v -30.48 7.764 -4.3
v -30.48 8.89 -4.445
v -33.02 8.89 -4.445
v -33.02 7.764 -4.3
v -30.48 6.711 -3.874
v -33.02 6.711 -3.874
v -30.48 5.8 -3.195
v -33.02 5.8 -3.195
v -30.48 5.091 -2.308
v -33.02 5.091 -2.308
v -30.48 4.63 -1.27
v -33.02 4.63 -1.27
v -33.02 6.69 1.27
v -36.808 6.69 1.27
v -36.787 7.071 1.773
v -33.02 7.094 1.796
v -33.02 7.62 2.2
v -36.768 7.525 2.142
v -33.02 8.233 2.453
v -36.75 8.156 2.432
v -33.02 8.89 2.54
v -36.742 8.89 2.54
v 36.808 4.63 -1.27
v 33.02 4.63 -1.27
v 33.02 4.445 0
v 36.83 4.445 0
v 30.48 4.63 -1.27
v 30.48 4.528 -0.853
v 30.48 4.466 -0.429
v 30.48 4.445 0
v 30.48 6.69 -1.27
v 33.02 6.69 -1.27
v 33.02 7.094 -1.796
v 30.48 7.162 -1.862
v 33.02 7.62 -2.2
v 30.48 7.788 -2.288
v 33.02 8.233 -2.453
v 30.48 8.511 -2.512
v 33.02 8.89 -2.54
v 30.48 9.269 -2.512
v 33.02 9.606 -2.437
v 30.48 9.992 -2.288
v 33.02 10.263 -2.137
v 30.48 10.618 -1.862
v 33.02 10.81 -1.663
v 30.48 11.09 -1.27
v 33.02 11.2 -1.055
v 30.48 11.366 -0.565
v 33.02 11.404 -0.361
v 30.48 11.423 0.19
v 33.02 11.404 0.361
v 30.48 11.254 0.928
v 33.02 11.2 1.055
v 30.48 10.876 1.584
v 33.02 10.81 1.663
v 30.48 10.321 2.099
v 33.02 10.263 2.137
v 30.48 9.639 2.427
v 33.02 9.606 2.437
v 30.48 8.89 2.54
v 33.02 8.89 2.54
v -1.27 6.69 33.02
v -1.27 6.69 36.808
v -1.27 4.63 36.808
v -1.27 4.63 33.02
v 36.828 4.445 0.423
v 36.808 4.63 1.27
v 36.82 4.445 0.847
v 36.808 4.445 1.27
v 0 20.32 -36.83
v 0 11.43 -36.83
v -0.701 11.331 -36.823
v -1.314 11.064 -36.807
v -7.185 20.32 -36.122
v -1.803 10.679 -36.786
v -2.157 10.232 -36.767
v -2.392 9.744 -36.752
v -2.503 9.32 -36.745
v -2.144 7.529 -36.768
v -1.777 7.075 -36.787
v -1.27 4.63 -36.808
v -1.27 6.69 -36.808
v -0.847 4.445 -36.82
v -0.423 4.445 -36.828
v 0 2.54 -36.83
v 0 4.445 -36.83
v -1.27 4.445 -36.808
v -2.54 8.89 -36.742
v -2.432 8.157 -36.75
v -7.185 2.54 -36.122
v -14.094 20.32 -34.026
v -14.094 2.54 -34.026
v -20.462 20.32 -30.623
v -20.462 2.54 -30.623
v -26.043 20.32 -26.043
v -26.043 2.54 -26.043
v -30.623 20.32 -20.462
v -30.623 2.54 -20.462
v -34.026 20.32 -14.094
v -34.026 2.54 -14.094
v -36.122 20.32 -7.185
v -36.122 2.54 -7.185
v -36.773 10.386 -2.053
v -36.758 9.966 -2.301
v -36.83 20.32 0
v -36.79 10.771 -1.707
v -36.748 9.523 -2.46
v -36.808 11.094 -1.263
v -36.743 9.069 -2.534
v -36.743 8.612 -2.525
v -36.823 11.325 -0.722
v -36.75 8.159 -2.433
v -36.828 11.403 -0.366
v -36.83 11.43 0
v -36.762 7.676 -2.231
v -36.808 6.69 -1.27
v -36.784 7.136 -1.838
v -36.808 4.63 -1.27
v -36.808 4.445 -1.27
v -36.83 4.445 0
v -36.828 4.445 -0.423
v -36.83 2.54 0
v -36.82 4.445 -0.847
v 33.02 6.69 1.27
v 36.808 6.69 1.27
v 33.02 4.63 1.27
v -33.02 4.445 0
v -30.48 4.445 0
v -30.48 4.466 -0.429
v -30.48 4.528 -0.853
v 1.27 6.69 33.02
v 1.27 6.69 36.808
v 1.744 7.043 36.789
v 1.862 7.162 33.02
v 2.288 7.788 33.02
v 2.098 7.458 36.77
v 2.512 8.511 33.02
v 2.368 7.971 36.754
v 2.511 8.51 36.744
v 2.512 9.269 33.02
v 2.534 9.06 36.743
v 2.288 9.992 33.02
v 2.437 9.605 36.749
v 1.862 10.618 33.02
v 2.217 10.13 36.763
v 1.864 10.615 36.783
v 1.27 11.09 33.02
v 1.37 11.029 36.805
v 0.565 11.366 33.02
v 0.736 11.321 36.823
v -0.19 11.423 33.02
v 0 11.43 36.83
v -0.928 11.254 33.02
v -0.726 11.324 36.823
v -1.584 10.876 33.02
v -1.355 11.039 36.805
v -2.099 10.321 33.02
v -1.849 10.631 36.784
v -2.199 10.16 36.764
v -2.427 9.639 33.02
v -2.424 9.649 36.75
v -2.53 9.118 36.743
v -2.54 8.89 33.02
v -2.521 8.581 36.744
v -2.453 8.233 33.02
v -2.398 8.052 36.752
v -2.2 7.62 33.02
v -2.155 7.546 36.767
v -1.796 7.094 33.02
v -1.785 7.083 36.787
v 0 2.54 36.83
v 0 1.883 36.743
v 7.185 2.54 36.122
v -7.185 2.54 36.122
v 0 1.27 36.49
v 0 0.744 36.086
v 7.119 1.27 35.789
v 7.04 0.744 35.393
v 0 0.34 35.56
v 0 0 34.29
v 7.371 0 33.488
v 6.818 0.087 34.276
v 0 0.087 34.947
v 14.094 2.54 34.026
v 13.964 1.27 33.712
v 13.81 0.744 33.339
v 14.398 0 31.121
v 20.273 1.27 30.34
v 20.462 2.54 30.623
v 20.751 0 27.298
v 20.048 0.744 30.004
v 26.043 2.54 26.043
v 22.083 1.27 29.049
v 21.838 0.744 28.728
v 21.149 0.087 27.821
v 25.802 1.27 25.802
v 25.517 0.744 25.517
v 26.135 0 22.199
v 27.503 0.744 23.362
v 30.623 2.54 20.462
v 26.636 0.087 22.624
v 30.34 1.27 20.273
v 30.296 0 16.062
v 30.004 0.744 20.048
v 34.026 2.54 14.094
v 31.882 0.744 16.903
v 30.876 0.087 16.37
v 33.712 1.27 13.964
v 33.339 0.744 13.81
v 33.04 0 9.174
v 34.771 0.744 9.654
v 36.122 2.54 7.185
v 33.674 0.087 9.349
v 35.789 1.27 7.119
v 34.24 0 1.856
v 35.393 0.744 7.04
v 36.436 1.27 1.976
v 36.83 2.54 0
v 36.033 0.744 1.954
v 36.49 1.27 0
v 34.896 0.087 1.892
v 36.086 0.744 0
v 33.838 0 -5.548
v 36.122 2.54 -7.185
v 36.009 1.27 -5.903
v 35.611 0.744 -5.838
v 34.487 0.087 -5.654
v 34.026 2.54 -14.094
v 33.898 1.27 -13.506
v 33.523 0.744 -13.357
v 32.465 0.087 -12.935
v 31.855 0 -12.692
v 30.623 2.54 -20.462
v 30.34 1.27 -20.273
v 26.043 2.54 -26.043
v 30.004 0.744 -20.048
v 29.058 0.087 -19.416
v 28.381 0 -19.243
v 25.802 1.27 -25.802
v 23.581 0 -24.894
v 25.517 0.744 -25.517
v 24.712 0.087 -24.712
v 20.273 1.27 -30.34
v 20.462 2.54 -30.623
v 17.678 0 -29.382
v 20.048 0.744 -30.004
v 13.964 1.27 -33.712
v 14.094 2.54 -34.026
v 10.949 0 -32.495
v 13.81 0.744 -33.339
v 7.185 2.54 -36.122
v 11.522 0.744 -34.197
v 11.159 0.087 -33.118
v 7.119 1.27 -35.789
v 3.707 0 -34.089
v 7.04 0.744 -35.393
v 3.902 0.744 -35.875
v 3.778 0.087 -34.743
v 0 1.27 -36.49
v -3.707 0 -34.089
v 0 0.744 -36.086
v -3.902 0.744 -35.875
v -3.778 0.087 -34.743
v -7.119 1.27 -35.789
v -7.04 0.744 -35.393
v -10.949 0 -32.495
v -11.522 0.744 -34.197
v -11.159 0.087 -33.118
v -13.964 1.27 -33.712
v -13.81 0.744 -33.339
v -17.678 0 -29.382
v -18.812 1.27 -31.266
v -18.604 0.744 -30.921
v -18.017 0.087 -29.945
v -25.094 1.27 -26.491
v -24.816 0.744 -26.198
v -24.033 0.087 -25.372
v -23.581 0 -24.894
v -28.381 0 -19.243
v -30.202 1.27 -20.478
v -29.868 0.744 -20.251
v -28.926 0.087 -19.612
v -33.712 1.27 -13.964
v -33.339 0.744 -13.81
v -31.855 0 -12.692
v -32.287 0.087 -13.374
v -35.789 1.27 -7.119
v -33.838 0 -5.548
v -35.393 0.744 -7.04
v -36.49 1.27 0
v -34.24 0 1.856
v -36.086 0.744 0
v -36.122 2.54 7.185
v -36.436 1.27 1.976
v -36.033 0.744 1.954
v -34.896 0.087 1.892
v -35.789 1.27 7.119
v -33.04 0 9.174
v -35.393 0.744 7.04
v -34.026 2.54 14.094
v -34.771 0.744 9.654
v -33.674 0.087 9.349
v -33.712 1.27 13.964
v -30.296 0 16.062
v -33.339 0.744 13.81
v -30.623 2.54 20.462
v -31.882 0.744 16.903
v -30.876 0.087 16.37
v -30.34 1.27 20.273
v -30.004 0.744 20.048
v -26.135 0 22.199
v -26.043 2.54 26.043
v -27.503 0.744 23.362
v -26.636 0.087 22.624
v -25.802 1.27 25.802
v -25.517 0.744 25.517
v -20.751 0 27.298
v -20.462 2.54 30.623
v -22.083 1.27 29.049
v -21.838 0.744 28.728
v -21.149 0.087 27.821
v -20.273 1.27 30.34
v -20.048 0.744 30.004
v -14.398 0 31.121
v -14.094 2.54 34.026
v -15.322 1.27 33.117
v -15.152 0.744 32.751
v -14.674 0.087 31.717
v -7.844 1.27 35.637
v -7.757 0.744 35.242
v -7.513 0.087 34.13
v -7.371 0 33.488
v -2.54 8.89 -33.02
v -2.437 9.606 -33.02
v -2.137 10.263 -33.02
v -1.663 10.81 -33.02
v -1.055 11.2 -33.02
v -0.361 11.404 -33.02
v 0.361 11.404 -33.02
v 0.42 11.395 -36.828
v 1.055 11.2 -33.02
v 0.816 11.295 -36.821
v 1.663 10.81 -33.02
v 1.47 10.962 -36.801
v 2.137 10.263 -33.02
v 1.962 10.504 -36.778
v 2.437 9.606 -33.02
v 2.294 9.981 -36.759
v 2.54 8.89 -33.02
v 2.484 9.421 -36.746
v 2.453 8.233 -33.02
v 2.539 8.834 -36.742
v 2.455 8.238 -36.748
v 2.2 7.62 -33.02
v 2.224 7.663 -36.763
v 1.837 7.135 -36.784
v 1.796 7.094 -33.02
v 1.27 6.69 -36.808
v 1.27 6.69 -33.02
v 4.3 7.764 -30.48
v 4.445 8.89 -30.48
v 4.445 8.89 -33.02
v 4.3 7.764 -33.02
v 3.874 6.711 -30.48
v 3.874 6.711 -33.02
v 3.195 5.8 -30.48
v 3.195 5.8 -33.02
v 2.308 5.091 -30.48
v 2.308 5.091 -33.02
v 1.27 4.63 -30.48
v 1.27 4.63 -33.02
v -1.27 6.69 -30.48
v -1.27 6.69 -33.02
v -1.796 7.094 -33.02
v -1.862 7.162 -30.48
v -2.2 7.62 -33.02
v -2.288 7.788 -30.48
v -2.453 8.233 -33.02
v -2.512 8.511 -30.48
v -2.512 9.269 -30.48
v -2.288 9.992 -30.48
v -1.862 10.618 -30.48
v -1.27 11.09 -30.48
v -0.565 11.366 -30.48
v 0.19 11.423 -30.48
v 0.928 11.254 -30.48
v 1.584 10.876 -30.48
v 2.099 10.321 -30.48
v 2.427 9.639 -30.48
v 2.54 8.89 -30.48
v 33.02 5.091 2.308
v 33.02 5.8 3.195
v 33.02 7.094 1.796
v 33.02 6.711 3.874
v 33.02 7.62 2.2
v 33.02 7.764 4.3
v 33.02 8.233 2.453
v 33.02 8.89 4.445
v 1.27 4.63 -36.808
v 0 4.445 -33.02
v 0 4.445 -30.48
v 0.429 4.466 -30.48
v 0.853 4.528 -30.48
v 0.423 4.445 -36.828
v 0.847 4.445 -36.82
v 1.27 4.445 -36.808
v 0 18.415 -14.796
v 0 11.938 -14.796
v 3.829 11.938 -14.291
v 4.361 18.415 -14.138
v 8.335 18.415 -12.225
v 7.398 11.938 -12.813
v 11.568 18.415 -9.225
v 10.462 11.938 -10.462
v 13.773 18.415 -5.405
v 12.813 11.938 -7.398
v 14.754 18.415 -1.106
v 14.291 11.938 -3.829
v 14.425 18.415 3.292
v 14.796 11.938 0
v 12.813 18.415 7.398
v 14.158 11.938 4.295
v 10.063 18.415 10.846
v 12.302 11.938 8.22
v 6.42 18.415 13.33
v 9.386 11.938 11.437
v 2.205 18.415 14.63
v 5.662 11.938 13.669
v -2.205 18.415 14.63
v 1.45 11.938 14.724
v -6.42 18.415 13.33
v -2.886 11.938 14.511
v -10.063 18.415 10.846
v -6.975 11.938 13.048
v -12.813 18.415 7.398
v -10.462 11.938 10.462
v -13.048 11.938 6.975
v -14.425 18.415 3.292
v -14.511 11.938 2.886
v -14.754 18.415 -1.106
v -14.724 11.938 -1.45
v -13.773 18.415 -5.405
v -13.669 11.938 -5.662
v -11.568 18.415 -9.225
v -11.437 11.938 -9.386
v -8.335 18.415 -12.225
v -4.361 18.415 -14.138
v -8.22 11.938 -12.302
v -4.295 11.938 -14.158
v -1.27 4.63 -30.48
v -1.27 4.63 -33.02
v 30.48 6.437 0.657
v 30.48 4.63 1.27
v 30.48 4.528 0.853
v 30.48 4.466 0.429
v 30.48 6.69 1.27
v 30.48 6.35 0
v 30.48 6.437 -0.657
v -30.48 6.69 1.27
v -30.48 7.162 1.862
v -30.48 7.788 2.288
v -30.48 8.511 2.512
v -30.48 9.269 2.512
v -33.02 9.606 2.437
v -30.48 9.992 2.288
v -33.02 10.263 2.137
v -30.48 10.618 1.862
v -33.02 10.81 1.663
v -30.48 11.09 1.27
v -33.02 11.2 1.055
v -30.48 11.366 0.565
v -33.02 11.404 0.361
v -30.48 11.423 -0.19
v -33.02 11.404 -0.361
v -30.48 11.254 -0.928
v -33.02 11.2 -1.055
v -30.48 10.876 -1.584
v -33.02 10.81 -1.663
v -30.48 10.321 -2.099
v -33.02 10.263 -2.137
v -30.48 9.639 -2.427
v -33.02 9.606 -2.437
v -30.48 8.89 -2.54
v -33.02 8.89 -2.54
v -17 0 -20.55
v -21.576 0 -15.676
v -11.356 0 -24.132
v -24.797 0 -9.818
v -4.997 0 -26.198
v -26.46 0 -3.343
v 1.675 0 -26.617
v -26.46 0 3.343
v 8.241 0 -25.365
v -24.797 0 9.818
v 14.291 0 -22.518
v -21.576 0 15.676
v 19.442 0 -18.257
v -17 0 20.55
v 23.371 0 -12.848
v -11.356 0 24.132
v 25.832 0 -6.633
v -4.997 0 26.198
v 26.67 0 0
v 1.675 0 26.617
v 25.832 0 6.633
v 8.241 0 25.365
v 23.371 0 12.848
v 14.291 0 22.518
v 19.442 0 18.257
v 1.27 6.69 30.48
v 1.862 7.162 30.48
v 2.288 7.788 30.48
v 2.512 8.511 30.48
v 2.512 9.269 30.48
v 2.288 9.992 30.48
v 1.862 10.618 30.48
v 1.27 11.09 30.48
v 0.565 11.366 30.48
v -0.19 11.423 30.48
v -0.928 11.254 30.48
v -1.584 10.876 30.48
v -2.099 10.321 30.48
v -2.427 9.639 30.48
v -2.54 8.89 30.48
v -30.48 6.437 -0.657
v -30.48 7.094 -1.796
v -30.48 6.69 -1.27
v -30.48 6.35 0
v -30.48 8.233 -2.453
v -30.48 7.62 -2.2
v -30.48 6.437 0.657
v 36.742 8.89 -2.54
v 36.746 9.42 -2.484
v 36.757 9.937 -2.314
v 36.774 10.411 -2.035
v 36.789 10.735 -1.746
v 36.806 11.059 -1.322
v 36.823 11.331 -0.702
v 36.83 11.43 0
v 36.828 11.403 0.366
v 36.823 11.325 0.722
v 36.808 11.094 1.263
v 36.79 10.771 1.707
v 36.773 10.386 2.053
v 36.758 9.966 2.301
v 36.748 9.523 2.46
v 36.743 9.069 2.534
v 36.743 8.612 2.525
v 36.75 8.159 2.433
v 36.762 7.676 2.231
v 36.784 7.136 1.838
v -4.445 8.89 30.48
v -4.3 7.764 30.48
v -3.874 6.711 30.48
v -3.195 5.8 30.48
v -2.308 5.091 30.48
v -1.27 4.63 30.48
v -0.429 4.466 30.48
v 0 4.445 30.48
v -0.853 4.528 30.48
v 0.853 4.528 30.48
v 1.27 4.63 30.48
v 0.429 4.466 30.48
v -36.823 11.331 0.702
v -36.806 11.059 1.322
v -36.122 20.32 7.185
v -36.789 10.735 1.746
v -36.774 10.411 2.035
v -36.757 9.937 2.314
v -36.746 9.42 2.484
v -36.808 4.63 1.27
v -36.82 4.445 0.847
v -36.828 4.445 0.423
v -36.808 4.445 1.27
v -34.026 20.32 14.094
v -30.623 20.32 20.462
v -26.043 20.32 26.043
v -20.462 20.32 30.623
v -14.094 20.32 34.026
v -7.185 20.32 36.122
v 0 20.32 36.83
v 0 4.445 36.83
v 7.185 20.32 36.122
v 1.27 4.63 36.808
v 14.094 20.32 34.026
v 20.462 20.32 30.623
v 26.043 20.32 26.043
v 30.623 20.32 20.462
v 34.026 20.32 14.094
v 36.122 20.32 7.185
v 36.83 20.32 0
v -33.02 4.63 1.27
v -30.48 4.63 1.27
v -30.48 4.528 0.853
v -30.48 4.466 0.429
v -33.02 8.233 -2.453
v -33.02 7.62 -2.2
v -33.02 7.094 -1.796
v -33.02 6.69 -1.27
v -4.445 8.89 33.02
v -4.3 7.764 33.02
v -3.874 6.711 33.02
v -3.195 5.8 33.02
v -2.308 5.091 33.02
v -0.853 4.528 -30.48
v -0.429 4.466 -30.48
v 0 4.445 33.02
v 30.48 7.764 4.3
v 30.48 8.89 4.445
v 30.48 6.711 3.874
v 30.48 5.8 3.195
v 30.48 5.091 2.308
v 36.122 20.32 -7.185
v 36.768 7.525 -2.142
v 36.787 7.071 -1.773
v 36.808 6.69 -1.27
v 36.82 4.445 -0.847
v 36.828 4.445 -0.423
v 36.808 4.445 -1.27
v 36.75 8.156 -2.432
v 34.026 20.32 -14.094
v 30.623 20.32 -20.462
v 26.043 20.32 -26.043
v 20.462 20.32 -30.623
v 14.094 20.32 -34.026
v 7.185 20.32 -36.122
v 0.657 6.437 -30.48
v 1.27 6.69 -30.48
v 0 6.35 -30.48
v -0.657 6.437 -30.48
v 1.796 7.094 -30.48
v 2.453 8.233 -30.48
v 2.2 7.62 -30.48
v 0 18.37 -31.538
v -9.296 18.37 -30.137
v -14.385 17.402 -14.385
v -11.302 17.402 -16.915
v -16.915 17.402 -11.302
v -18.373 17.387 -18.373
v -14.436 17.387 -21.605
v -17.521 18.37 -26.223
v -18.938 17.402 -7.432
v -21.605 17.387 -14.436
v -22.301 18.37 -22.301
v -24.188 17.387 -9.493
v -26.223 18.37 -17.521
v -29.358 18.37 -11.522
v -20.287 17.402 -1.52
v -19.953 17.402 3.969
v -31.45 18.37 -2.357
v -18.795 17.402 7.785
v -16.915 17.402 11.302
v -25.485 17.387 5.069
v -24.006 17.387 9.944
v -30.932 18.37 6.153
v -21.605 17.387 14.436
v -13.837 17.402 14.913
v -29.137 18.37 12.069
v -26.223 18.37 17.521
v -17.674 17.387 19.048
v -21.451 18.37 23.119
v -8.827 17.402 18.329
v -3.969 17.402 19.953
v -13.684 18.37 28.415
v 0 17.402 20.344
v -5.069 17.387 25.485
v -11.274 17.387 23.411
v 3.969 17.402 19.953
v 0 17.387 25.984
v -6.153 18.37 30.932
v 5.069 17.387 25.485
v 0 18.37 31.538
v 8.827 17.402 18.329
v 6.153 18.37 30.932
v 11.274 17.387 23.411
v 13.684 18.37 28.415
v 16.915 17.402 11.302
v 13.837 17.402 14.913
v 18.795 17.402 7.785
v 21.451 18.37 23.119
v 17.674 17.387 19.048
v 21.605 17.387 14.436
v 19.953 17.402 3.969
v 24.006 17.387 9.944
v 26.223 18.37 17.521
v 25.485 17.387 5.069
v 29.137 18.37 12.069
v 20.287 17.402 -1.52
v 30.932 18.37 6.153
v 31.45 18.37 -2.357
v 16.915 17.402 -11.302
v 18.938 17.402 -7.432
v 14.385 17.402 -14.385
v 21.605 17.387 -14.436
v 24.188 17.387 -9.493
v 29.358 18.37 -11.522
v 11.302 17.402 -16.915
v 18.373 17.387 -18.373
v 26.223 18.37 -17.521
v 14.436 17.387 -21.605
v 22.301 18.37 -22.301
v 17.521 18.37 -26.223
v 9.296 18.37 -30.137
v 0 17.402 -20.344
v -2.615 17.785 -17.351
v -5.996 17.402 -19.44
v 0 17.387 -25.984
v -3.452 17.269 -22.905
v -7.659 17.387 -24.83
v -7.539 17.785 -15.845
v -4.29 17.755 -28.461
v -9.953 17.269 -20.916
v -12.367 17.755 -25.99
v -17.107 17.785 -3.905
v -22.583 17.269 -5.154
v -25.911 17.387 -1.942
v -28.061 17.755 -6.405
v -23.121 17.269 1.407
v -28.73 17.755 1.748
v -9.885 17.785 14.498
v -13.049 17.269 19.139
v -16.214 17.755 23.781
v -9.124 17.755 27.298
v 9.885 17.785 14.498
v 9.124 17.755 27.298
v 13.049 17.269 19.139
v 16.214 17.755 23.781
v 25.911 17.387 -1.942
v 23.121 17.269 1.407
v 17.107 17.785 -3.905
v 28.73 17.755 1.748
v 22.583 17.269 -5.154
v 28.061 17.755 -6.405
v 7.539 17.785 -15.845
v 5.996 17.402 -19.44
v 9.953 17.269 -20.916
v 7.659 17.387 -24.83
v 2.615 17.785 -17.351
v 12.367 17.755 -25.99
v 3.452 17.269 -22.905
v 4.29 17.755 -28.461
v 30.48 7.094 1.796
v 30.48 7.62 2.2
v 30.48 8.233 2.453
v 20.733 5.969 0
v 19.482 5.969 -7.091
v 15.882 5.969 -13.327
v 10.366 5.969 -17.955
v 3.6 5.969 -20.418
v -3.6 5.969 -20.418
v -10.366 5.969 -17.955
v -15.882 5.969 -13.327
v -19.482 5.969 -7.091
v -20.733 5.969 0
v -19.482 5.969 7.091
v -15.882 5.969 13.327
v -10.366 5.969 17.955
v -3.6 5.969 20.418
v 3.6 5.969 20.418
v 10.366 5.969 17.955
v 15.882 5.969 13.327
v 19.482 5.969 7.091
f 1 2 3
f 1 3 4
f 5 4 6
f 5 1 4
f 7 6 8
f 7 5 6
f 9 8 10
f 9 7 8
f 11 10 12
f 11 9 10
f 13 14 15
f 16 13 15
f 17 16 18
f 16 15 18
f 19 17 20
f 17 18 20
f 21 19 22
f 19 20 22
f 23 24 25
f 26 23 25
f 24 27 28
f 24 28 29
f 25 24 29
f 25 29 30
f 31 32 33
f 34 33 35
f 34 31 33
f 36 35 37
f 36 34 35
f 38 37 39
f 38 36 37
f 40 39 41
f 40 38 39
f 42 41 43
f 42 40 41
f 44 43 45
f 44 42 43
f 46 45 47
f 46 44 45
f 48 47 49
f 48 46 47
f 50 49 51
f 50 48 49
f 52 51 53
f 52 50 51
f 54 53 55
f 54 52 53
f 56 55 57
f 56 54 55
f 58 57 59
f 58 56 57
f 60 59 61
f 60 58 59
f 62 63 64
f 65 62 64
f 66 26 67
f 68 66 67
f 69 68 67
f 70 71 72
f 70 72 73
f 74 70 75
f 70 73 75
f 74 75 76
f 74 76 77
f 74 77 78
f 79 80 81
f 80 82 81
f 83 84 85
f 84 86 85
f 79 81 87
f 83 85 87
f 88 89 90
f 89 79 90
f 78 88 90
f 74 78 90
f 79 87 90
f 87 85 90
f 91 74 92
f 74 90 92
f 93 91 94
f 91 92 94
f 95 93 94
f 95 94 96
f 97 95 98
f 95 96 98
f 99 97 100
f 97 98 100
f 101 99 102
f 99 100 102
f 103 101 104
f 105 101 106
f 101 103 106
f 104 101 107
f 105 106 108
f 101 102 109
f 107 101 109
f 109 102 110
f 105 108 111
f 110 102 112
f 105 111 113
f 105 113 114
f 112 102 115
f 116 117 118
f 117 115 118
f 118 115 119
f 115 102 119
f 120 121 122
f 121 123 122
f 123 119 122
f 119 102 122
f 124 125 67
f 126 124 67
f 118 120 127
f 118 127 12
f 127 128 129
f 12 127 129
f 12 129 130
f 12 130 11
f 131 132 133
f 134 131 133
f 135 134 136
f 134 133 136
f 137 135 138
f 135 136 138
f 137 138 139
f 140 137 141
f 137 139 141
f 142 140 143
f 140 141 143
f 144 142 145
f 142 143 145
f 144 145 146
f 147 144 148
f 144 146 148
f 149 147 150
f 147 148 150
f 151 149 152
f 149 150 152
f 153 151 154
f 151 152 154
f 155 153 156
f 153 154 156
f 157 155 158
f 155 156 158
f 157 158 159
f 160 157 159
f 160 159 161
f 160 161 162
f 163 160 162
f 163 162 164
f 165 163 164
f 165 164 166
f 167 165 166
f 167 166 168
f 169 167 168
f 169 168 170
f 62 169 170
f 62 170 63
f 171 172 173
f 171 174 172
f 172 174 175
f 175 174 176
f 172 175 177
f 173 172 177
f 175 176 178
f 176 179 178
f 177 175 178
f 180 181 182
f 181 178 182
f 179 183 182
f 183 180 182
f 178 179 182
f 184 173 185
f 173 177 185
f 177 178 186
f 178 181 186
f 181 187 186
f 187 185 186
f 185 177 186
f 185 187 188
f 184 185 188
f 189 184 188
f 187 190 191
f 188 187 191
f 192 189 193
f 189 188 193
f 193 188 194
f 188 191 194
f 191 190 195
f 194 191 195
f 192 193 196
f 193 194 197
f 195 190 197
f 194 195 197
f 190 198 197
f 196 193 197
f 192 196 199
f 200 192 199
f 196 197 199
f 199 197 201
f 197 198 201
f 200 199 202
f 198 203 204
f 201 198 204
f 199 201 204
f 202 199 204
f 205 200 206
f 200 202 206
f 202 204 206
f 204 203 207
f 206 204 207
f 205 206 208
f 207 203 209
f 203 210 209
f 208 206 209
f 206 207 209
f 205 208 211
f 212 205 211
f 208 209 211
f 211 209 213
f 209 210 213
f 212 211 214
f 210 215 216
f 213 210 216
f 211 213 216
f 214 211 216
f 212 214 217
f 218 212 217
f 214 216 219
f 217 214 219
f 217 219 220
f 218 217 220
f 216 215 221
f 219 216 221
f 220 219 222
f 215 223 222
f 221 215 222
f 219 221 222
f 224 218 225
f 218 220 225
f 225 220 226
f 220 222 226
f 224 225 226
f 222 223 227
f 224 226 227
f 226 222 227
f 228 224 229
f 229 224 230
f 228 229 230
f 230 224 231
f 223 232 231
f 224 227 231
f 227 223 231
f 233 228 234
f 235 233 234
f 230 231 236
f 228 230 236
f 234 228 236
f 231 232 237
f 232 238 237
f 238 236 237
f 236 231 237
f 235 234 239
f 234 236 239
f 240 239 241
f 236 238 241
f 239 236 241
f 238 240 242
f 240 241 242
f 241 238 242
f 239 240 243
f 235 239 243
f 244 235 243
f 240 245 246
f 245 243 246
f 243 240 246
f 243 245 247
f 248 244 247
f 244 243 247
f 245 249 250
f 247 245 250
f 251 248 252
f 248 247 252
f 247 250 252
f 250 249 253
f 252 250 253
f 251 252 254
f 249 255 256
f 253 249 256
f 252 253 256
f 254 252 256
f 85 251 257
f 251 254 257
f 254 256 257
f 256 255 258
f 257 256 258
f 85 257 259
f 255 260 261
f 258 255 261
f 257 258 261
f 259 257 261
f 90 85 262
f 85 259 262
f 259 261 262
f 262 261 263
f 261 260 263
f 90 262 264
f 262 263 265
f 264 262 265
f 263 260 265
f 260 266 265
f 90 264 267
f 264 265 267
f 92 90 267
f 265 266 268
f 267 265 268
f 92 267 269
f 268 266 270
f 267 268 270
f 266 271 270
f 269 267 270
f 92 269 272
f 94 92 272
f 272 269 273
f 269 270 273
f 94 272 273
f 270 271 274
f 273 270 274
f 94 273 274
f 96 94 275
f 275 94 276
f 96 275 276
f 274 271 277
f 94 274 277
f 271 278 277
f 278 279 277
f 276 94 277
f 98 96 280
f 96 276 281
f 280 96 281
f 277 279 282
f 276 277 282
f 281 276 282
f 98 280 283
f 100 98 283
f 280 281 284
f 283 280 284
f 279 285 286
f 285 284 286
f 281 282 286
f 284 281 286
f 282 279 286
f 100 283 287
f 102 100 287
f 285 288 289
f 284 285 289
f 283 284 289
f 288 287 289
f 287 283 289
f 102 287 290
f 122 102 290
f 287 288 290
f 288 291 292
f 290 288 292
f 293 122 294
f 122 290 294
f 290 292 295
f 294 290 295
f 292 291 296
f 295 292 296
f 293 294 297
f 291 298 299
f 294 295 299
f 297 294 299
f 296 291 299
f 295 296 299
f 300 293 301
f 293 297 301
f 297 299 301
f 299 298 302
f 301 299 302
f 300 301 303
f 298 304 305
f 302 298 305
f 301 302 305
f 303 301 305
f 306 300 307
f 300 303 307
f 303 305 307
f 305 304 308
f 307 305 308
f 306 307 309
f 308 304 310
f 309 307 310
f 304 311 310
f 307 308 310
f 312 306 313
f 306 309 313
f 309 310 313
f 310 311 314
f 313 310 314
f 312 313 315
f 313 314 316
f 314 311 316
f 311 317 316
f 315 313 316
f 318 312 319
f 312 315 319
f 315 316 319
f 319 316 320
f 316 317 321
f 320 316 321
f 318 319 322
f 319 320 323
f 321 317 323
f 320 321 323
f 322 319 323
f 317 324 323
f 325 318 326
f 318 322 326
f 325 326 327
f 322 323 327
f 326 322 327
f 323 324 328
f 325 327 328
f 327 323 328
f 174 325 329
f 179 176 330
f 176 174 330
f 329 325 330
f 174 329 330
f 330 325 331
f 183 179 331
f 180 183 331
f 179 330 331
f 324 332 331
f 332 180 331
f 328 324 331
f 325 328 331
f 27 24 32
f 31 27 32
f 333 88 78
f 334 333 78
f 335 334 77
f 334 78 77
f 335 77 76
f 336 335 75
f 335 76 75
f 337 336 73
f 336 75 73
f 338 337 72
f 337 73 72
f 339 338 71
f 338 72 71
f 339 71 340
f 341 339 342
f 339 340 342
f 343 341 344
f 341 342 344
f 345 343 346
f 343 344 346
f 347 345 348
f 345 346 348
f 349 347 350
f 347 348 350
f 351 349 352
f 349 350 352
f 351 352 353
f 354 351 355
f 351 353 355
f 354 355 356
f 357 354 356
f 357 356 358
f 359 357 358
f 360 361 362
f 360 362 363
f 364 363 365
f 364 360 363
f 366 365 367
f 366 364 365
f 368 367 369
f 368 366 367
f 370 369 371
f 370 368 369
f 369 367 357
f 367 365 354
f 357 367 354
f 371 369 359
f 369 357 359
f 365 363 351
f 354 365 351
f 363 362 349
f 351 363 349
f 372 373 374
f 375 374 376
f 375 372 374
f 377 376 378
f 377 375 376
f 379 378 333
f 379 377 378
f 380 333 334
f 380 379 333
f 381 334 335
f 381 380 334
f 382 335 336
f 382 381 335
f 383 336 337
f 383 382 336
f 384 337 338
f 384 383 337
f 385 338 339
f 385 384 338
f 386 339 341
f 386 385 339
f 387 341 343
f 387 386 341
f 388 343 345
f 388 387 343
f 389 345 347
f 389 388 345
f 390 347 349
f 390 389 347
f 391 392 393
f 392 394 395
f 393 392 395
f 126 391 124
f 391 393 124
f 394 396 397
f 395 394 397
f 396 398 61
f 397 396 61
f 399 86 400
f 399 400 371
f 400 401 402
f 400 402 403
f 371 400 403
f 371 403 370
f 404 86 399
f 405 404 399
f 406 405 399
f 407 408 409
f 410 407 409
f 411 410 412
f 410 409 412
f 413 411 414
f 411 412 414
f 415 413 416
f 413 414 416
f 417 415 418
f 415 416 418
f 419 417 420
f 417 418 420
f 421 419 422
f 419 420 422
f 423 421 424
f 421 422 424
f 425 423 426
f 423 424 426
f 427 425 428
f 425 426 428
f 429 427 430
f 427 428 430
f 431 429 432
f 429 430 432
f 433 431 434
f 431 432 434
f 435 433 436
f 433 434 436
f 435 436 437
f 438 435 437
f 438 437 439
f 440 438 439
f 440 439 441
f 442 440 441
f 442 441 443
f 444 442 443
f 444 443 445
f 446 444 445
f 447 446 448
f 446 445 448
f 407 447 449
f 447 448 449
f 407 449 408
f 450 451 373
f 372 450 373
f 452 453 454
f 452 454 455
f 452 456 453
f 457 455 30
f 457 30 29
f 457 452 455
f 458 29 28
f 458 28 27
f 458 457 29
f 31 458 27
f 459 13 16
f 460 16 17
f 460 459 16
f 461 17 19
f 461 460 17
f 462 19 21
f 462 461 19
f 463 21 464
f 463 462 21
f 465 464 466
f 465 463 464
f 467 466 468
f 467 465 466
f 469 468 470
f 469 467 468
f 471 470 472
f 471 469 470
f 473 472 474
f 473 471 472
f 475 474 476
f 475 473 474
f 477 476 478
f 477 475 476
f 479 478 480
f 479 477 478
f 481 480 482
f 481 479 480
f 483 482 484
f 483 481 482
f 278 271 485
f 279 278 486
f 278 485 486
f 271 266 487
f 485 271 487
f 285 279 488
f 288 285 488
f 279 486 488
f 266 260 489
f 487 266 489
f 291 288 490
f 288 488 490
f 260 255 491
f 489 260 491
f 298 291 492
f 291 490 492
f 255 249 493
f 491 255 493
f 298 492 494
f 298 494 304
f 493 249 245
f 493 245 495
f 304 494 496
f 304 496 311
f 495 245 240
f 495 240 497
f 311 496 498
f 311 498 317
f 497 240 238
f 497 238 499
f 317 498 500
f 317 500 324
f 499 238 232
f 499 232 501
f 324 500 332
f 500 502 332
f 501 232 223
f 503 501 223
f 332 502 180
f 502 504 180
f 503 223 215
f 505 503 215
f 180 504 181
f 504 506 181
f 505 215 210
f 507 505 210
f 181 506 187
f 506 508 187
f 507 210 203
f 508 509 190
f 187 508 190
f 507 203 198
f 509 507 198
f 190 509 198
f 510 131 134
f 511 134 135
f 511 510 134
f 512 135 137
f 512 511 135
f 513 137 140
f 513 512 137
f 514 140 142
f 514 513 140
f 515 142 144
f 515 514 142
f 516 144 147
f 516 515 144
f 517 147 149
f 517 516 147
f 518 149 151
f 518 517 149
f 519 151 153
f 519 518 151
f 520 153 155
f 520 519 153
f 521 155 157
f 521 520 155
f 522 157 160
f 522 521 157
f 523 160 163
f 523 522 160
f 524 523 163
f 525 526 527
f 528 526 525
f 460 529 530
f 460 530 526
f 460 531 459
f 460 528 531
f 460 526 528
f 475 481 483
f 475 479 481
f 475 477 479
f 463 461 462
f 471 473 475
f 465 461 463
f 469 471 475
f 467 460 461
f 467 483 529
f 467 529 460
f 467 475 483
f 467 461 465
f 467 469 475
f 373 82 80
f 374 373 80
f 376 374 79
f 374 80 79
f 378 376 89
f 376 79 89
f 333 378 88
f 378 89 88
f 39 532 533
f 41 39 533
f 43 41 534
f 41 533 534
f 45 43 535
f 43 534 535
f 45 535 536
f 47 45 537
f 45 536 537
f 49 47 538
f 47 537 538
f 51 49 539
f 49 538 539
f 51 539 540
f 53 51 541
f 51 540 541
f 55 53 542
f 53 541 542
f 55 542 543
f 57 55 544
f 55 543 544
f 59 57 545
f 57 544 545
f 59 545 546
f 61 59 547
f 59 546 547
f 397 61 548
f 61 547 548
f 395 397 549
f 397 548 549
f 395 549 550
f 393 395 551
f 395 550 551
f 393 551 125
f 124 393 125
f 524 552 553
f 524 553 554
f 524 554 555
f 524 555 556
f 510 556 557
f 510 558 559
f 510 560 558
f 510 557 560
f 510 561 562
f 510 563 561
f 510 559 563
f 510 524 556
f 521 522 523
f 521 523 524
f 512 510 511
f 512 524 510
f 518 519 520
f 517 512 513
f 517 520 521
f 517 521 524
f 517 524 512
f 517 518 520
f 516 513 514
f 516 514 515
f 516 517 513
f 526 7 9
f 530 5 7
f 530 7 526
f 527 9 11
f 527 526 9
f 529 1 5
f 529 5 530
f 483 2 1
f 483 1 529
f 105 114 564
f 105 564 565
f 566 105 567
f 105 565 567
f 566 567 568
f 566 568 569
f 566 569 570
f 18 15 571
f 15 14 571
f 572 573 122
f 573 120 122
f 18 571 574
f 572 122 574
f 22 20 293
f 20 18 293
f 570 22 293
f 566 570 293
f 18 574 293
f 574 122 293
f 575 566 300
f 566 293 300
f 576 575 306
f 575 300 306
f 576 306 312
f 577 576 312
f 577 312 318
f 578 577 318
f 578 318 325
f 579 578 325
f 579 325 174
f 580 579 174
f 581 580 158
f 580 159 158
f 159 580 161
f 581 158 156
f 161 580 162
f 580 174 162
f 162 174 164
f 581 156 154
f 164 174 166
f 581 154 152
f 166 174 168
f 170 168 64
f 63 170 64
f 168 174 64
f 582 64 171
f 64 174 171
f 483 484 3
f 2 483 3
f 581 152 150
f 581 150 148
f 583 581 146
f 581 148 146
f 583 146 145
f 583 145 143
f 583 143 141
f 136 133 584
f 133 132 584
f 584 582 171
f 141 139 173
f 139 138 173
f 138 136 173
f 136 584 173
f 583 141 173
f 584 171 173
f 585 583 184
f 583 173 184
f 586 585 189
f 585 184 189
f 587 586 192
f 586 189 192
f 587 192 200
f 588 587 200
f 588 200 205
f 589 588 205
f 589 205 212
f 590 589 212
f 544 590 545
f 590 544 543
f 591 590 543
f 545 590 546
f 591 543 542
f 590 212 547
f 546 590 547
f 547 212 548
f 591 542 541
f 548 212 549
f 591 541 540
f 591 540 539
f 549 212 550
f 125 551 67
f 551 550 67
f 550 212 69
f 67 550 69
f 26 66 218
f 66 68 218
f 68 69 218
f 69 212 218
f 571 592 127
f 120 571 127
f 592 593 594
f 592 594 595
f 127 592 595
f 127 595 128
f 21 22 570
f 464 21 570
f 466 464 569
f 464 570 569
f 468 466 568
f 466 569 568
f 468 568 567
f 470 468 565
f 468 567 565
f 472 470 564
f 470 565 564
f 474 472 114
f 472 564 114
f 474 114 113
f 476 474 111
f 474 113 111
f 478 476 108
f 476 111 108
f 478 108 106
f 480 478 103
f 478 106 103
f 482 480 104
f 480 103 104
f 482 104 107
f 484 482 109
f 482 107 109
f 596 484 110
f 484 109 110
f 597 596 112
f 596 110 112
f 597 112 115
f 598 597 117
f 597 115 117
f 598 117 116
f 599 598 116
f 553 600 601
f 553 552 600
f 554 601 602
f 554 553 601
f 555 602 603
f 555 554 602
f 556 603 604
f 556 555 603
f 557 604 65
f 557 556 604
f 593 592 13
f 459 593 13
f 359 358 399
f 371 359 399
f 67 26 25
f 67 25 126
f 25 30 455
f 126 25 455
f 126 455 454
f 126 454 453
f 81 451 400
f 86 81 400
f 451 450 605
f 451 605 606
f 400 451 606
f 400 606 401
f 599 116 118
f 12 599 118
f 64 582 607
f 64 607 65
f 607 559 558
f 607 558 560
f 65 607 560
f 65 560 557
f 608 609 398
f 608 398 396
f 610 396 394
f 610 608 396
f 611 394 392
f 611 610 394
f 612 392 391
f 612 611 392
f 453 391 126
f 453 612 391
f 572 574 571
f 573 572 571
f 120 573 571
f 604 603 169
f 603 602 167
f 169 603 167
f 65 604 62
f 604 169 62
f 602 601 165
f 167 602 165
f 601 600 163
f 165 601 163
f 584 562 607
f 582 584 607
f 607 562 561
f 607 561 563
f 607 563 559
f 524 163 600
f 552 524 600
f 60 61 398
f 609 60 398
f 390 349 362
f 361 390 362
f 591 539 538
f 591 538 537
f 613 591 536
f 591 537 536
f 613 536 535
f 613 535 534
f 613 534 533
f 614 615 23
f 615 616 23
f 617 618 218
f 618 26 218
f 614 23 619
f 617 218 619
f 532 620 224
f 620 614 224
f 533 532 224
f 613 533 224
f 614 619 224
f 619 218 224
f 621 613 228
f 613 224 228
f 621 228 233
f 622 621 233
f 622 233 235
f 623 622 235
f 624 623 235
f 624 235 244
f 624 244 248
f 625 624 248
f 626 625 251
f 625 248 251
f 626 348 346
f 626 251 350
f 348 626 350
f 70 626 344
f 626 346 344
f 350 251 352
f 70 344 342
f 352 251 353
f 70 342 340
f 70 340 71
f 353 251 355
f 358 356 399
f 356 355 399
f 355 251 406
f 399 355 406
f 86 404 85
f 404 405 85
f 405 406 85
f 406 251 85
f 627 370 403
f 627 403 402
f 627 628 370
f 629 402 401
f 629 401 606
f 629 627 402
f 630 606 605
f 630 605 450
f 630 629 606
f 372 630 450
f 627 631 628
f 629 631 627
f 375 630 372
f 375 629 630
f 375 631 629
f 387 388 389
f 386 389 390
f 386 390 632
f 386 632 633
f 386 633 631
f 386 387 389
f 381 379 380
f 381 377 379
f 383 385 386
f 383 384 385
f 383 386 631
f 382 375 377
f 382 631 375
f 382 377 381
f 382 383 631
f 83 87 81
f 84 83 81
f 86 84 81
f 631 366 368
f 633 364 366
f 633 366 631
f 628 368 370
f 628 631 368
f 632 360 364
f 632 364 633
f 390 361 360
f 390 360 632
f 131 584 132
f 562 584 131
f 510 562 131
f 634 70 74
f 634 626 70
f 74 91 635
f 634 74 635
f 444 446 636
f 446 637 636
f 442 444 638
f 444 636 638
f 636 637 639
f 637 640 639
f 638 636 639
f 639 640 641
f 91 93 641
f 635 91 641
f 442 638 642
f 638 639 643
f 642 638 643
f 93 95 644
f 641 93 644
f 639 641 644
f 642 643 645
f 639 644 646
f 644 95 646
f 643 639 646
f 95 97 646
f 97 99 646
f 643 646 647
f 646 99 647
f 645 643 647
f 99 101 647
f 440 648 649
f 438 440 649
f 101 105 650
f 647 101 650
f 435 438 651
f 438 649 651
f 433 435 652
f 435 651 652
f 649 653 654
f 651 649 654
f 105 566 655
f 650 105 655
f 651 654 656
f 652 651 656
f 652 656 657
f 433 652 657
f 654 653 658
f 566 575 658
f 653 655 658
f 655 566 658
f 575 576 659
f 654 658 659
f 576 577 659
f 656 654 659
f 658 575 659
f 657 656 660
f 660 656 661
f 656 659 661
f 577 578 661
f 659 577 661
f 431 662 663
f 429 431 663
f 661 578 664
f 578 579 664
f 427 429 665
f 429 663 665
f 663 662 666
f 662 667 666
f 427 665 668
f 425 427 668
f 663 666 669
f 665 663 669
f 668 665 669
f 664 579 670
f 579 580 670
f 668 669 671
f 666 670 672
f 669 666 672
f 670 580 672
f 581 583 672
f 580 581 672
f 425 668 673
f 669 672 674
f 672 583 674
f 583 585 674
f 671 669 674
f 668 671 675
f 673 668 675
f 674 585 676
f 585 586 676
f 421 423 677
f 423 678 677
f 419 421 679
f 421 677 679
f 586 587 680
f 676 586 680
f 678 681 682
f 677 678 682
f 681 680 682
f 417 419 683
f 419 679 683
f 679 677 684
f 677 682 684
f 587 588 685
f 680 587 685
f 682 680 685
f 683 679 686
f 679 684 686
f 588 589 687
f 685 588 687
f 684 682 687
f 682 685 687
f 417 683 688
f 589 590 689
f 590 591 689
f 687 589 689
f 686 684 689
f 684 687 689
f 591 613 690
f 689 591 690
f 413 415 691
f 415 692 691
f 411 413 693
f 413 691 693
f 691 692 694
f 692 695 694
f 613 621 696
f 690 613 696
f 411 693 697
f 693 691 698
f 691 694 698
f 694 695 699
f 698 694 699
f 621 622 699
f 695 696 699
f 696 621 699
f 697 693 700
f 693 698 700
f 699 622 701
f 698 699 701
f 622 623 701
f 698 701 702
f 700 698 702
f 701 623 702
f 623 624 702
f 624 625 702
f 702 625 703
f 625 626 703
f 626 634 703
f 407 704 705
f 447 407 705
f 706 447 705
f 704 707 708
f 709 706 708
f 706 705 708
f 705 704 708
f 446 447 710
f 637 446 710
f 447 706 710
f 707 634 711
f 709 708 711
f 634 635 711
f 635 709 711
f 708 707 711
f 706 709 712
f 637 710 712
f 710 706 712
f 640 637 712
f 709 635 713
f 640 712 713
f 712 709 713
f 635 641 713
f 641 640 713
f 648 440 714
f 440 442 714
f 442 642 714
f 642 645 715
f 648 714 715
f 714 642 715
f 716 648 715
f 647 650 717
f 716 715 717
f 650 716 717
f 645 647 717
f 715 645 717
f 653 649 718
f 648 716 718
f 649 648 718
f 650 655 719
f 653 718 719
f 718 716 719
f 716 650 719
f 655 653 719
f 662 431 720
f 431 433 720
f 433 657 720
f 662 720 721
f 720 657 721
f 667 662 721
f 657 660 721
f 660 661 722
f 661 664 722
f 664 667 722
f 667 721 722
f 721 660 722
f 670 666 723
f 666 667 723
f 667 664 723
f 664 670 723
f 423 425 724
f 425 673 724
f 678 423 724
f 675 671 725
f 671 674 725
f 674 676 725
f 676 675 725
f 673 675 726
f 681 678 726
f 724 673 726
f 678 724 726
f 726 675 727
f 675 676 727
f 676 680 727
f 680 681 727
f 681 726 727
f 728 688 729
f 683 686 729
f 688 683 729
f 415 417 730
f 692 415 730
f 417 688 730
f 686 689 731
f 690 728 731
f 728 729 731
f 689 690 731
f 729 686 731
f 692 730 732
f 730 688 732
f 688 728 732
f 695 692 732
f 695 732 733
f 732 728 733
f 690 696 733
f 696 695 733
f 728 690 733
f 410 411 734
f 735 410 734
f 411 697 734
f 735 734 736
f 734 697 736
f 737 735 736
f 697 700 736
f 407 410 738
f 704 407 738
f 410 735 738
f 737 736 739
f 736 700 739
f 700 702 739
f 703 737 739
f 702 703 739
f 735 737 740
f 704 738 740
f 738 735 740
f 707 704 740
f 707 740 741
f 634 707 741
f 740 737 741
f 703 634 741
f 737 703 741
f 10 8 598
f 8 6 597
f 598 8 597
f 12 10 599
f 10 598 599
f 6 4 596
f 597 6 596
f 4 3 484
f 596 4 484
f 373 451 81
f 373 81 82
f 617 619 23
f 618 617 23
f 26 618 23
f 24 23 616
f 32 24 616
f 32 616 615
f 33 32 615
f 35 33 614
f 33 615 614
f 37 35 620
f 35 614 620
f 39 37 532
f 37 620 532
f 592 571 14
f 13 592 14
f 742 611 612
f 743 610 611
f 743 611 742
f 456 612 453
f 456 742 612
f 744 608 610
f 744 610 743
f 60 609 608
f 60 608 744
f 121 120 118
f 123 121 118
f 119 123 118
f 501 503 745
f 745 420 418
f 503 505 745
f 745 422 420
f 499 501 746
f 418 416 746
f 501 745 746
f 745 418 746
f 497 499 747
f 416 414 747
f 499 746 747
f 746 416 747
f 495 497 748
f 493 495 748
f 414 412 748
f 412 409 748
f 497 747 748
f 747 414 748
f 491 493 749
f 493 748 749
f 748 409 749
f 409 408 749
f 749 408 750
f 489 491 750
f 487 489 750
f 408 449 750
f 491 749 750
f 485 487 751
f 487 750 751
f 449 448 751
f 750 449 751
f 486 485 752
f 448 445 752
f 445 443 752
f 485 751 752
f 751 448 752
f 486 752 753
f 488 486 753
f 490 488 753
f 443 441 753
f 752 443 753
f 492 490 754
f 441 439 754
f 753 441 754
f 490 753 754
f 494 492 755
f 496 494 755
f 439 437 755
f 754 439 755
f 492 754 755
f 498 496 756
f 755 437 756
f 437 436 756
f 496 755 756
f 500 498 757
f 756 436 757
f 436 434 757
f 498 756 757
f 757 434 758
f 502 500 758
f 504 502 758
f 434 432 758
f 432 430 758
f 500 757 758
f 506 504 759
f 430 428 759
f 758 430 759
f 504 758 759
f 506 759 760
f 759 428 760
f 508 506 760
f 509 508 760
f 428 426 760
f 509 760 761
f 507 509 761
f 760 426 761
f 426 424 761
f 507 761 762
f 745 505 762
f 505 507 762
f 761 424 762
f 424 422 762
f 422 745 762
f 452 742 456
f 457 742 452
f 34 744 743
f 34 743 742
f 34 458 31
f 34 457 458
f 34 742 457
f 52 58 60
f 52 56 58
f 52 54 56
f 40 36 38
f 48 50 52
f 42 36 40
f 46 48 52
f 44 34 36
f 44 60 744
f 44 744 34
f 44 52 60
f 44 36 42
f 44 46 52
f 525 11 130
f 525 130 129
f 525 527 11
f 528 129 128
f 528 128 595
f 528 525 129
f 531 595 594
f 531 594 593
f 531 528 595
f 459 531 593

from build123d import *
from build123d.topology import SkipClean

# Parameters (mm, degrees)
SKETCH1_R           = 36.83
BOSS_EXTRUDE1_DEPTH = 20.32
FILLET1_R           = 2.54
SKETCH2_R           = 26.67
SKETCH3_R           = 14.7955
SKETCH4_R           = 14.7955
CUT_EXTRUDE1_DEPTH  = 76.2
SKETCH8_R           = 2.54
CUT_EXTRUDE2_DEPTH  = 6.35
CIRPATTERN1_COUNT   = 4
CUT_EXTRUDE3_DEPTH  = 6.35
SKETCH10_R          = 4.445
CUT_EXTRUDE4_DEPTH  = 2.54
BOSS_EXTRUDE2_DEPTH = 2.54
BOSS_EXTRUDE3_DEPTH = 6.35
SKETCH13_R          = 39.975148753
SKETCH13_R_2        = 36.83
CUT_EXTRUDE5_DEPTH  = 21.59
CIRPATTERN2_COUNT   = 4


with BuildPart() as part:
    # Sketch1 → Boss-Extrude1 (new body)
    with BuildSketch(Plane(origin=(0, 0, 0), x_dir=(1, 0, 0), z_dir=(0, 1, 0))):
        with Locations(Location((0, 0, 0), (0, 0, 270))):
            Circle(SKETCH1_R)
    extrude(amount=BOSS_EXTRUDE1_DEPTH)

    # Fillet1
    fillet1_edges = [part.edges().sort_by_distance(p)[0] for p in [
        (0, 0, -36.83),
    ]]
    fillet(fillet1_edges, radius=FILLET1_R)

    # Sketch2 → Cut-Loft1 section 0
    with BuildSketch(Plane(origin=(0, 0, 0), x_dir=(1, 0, 0), z_dir=(0, 1, 0))):
        Circle(SKETCH2_R)
    # Sketch3 → Cut-Loft1 section 1
    with BuildSketch(Plane(origin=(0, 11.938, 0), x_dir=(1, 0, 0), z_dir=(0, 1, 0))):
        Circle(SKETCH3_R)
    loft(mode=Mode.SUBTRACT)

    # Sketch4 → Cut-Extrude1 (cut)
    with BuildSketch(Plane.XZ.offset(-11.938)):
        with Locations(Location((0, 0, 0), (0, 0, 270))):
            Circle(SKETCH4_R)
    extrude(amount=-CUT_EXTRUDE1_DEPTH, mode=Mode.SUBTRACT)

    # Sketch8 → Cut-Extrude2 (cut)
    with BuildSketch(Plane.XY.offset(36.83)):
        with Locations((0, 8.89)):
            Circle(SKETCH8_R)
    cut_extrude2 = extrude(amount=-CUT_EXTRUDE2_DEPTH, mode=Mode.SUBTRACT)

    # CirPattern1: Cut-Extrude2 ×4 about axis
    cirpattern1_axis = Axis((0, 0, 0), (0, 1, 0))
    for i in range(1, CIRPATTERN1_COUNT):
        add(cut_extrude2.rotate(cirpattern1_axis, i * 360 / CIRPATTERN1_COUNT), mode=Mode.SUBTRACT)

    # Sketch9 → Cut-Extrude3 (cut)
    with BuildSketch(Plane.XY.offset(36.83)):
        with BuildLine():
            Line((-1.27, 4.445), (1.27, 4.445))
            Line((1.27, 4.445), (1.27, 6.690295474))
            ThreePointArc((1.27, 6.690295474), (0, 6.35), (-1.27, 6.690295474))
            Line((-1.27, 6.690295474), (-1.27, 4.445))
        make_face()
    cut_extrude3 = extrude(amount=-CUT_EXTRUDE3_DEPTH, mode=Mode.SUBTRACT)

    # Sketch10 → Cut-Extrude4 (cut)
    with BuildSketch(Plane.XY.offset(30.48)):
        with Locations((0, 8.89)):
            Circle(SKETCH10_R)
    cut_extrude4 = extrude(amount=CUT_EXTRUDE4_DEPTH, mode=Mode.SUBTRACT)

    # Sketch11 → Boss-Extrude2 (add)
    with BuildSketch(Plane.XY.offset(30.48)):
        with BuildLine():
            Line((-2.54, 8.89), (-4.445, 8.89))
            ThreePointArc((-4.445, 8.89), (2.656395584, 12.453928661), (1.27, 4.630290503))
            Line((1.27, 4.630290503), (1.27, 6.690295474))
            ThreePointArc((1.27, 6.690295474), (1.27, 11.089704526), (-2.54, 8.89))
        make_face()
    boss_extrude2 = extrude(amount=BOSS_EXTRUDE2_DEPTH)

    # Sketch12 → Boss-Extrude3 (add)
    with BuildSketch(Plane.XY.offset(30.48)):
        with BuildLine():
            Line((-1.27, 4.445), (-1.1e-08, 4.445))
            ThreePointArc((-1.1e-08, 4.445), (-0.641722798, 4.491566546), (-1.27, 4.630290503))
            Line((-1.27, 4.630290503), (-1.27, 4.445))
        make_face()
        with BuildLine():
            Line((-1.1e-08, 4.445), (1.27, 4.445))
            Line((1.27, 4.445), (1.27, 4.630290503))
            ThreePointArc((1.27, 4.630290503), (0.641722787, 4.491566544), (-1.1e-08, 4.445))
        make_face()
    boss_extrude3 = extrude(amount=BOSS_EXTRUDE3_DEPTH)

    # Sketch13 → Cut-Extrude5 (cut)
    with BuildSketch(Plane.XZ):
        Circle(SKETCH13_R)
        with Locations(Location((0, 0, 0), (0, 0, 90))):
            Circle(SKETCH13_R_2, mode=Mode.SUBTRACT)
    cut_extrude5 = extrude(amount=-CUT_EXTRUDE5_DEPTH, mode=Mode.SUBTRACT)

    # CirPattern2: Cut-Extrude3, Cut-Extrude4, Boss-Extrude2, Boss-Extrude3, Cut-Extrude5 ×4 about axis
    with SkipClean():  # the faces are left unmerged after this step: merging them gives an invalid solid
        cirpattern2_axis = Axis((0, 0, 0), (0, 1, 0))
        add([cut_extrude3.rotate(cirpattern2_axis, i * 360 / CIRPATTERN2_COUNT) for i in range(1, CIRPATTERN2_COUNT)], mode=Mode.SUBTRACT)
        add([cut_extrude4.rotate(cirpattern2_axis, i * 360 / CIRPATTERN2_COUNT) for i in range(1, CIRPATTERN2_COUNT)], mode=Mode.SUBTRACT)
        add([boss_extrude2.rotate(cirpattern2_axis, i * 360 / CIRPATTERN2_COUNT) for i in range(1, CIRPATTERN2_COUNT)])
        add([boss_extrude3.rotate(cirpattern2_axis, i * 360 / CIRPATTERN2_COUNT) for i in range(1, CIRPATTERN2_COUNT)])
        add([cut_extrude5.rotate(cirpattern2_axis, i * 360 / CIRPATTERN2_COUNT) for i in range(1, CIRPATTERN2_COUNT)], mode=Mode.SUBTRACT)
    add(part.part.scale(1), mode=Mode.REPLACE)  # the faces are merged on a copy

    # Sketch17 → Cut-Revolve1 (revolve, cut)
    with BuildSketch(Plane(origin=(0, 0, 0), x_dir=(0, 0, -1), z_dir=(1, 0, 0))):
        with BuildLine():
            Line((36.83, 20.32), (14.7955, 20.32))
            Line((14.7955, 20.32), (14.7955, 18.415))
            ThreePointArc((14.7955, 18.415), (25.983986176, 17.386868237), (36.83, 20.32))
        make_face()
    revolve(axis=Axis((0, 0, 0), (0, 1, 0)), mode=Mode.SUBTRACT)


solid = part.part
